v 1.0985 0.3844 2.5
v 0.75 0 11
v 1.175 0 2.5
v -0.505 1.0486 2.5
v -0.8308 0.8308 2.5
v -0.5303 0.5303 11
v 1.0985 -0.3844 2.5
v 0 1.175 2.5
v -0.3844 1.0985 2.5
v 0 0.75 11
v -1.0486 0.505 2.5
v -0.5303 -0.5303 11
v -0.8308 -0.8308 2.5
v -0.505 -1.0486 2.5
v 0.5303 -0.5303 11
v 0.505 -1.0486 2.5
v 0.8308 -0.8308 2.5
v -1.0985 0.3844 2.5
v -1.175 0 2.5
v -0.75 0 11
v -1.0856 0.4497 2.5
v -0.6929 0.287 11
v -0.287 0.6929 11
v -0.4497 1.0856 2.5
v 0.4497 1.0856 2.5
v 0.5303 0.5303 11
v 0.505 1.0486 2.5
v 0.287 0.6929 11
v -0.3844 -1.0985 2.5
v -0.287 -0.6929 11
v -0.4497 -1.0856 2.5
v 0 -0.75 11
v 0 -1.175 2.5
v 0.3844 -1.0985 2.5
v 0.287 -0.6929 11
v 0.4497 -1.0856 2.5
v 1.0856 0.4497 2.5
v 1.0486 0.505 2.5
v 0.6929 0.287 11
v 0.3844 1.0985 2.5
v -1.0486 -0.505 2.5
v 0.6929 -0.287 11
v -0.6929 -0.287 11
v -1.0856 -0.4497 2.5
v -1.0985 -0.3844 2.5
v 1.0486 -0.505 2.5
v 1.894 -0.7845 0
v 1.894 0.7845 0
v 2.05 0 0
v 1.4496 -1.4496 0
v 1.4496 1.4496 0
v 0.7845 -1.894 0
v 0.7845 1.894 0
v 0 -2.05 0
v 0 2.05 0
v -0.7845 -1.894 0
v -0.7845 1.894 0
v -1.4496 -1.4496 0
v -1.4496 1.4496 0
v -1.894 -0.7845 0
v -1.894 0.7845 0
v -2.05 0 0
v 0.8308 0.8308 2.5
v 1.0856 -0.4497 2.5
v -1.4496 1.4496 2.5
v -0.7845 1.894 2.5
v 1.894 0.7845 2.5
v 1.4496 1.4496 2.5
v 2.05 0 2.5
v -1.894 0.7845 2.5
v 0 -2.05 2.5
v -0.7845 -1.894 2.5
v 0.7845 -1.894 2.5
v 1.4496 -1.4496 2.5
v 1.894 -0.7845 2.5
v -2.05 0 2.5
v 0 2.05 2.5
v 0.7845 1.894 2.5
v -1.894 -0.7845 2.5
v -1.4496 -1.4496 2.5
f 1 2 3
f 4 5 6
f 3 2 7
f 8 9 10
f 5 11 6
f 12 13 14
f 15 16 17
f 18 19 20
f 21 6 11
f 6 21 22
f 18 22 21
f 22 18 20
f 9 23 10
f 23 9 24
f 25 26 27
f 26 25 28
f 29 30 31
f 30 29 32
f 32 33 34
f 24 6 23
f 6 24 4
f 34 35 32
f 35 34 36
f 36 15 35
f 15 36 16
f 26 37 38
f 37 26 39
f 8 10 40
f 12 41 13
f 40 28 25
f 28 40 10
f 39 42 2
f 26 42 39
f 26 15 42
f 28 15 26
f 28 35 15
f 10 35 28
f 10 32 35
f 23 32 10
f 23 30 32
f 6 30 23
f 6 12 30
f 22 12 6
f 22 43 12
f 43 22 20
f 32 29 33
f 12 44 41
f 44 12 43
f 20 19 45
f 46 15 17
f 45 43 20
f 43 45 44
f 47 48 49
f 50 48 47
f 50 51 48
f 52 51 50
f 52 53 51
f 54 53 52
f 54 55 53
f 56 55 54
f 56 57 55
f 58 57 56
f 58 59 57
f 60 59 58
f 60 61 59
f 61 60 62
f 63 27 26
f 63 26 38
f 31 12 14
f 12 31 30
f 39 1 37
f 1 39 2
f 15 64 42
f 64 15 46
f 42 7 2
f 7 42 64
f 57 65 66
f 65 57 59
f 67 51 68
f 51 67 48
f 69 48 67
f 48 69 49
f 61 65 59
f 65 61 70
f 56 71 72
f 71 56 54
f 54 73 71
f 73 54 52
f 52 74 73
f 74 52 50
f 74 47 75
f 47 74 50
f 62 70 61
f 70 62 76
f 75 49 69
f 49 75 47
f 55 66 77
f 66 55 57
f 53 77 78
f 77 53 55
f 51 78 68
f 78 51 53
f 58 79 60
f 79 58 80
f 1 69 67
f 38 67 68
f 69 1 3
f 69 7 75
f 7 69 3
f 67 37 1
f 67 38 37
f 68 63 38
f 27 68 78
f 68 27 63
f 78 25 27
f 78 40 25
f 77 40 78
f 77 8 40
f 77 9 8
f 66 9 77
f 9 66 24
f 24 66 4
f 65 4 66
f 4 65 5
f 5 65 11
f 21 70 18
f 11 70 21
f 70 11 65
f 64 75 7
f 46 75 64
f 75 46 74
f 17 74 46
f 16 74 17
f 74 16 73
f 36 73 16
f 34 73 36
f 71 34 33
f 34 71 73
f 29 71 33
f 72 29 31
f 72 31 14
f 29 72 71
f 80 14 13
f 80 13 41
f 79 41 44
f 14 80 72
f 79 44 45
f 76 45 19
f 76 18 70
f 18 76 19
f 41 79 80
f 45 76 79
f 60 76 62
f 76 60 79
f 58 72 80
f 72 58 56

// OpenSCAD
//
// An extractor spring bearing with the base thickness similar to the non-LCI
//
// Use a heat-resistant material (ABS at least).

// These measurements are a little larger than the stock bearing,
// measured with calipers. For some reason, the print tends to come
// out smaller than expected.

$fn=16;
cylinder(11.0, 2.6/2, 1.5/2);
cylinder(2.5, 4.1/2, 4.1/2);
